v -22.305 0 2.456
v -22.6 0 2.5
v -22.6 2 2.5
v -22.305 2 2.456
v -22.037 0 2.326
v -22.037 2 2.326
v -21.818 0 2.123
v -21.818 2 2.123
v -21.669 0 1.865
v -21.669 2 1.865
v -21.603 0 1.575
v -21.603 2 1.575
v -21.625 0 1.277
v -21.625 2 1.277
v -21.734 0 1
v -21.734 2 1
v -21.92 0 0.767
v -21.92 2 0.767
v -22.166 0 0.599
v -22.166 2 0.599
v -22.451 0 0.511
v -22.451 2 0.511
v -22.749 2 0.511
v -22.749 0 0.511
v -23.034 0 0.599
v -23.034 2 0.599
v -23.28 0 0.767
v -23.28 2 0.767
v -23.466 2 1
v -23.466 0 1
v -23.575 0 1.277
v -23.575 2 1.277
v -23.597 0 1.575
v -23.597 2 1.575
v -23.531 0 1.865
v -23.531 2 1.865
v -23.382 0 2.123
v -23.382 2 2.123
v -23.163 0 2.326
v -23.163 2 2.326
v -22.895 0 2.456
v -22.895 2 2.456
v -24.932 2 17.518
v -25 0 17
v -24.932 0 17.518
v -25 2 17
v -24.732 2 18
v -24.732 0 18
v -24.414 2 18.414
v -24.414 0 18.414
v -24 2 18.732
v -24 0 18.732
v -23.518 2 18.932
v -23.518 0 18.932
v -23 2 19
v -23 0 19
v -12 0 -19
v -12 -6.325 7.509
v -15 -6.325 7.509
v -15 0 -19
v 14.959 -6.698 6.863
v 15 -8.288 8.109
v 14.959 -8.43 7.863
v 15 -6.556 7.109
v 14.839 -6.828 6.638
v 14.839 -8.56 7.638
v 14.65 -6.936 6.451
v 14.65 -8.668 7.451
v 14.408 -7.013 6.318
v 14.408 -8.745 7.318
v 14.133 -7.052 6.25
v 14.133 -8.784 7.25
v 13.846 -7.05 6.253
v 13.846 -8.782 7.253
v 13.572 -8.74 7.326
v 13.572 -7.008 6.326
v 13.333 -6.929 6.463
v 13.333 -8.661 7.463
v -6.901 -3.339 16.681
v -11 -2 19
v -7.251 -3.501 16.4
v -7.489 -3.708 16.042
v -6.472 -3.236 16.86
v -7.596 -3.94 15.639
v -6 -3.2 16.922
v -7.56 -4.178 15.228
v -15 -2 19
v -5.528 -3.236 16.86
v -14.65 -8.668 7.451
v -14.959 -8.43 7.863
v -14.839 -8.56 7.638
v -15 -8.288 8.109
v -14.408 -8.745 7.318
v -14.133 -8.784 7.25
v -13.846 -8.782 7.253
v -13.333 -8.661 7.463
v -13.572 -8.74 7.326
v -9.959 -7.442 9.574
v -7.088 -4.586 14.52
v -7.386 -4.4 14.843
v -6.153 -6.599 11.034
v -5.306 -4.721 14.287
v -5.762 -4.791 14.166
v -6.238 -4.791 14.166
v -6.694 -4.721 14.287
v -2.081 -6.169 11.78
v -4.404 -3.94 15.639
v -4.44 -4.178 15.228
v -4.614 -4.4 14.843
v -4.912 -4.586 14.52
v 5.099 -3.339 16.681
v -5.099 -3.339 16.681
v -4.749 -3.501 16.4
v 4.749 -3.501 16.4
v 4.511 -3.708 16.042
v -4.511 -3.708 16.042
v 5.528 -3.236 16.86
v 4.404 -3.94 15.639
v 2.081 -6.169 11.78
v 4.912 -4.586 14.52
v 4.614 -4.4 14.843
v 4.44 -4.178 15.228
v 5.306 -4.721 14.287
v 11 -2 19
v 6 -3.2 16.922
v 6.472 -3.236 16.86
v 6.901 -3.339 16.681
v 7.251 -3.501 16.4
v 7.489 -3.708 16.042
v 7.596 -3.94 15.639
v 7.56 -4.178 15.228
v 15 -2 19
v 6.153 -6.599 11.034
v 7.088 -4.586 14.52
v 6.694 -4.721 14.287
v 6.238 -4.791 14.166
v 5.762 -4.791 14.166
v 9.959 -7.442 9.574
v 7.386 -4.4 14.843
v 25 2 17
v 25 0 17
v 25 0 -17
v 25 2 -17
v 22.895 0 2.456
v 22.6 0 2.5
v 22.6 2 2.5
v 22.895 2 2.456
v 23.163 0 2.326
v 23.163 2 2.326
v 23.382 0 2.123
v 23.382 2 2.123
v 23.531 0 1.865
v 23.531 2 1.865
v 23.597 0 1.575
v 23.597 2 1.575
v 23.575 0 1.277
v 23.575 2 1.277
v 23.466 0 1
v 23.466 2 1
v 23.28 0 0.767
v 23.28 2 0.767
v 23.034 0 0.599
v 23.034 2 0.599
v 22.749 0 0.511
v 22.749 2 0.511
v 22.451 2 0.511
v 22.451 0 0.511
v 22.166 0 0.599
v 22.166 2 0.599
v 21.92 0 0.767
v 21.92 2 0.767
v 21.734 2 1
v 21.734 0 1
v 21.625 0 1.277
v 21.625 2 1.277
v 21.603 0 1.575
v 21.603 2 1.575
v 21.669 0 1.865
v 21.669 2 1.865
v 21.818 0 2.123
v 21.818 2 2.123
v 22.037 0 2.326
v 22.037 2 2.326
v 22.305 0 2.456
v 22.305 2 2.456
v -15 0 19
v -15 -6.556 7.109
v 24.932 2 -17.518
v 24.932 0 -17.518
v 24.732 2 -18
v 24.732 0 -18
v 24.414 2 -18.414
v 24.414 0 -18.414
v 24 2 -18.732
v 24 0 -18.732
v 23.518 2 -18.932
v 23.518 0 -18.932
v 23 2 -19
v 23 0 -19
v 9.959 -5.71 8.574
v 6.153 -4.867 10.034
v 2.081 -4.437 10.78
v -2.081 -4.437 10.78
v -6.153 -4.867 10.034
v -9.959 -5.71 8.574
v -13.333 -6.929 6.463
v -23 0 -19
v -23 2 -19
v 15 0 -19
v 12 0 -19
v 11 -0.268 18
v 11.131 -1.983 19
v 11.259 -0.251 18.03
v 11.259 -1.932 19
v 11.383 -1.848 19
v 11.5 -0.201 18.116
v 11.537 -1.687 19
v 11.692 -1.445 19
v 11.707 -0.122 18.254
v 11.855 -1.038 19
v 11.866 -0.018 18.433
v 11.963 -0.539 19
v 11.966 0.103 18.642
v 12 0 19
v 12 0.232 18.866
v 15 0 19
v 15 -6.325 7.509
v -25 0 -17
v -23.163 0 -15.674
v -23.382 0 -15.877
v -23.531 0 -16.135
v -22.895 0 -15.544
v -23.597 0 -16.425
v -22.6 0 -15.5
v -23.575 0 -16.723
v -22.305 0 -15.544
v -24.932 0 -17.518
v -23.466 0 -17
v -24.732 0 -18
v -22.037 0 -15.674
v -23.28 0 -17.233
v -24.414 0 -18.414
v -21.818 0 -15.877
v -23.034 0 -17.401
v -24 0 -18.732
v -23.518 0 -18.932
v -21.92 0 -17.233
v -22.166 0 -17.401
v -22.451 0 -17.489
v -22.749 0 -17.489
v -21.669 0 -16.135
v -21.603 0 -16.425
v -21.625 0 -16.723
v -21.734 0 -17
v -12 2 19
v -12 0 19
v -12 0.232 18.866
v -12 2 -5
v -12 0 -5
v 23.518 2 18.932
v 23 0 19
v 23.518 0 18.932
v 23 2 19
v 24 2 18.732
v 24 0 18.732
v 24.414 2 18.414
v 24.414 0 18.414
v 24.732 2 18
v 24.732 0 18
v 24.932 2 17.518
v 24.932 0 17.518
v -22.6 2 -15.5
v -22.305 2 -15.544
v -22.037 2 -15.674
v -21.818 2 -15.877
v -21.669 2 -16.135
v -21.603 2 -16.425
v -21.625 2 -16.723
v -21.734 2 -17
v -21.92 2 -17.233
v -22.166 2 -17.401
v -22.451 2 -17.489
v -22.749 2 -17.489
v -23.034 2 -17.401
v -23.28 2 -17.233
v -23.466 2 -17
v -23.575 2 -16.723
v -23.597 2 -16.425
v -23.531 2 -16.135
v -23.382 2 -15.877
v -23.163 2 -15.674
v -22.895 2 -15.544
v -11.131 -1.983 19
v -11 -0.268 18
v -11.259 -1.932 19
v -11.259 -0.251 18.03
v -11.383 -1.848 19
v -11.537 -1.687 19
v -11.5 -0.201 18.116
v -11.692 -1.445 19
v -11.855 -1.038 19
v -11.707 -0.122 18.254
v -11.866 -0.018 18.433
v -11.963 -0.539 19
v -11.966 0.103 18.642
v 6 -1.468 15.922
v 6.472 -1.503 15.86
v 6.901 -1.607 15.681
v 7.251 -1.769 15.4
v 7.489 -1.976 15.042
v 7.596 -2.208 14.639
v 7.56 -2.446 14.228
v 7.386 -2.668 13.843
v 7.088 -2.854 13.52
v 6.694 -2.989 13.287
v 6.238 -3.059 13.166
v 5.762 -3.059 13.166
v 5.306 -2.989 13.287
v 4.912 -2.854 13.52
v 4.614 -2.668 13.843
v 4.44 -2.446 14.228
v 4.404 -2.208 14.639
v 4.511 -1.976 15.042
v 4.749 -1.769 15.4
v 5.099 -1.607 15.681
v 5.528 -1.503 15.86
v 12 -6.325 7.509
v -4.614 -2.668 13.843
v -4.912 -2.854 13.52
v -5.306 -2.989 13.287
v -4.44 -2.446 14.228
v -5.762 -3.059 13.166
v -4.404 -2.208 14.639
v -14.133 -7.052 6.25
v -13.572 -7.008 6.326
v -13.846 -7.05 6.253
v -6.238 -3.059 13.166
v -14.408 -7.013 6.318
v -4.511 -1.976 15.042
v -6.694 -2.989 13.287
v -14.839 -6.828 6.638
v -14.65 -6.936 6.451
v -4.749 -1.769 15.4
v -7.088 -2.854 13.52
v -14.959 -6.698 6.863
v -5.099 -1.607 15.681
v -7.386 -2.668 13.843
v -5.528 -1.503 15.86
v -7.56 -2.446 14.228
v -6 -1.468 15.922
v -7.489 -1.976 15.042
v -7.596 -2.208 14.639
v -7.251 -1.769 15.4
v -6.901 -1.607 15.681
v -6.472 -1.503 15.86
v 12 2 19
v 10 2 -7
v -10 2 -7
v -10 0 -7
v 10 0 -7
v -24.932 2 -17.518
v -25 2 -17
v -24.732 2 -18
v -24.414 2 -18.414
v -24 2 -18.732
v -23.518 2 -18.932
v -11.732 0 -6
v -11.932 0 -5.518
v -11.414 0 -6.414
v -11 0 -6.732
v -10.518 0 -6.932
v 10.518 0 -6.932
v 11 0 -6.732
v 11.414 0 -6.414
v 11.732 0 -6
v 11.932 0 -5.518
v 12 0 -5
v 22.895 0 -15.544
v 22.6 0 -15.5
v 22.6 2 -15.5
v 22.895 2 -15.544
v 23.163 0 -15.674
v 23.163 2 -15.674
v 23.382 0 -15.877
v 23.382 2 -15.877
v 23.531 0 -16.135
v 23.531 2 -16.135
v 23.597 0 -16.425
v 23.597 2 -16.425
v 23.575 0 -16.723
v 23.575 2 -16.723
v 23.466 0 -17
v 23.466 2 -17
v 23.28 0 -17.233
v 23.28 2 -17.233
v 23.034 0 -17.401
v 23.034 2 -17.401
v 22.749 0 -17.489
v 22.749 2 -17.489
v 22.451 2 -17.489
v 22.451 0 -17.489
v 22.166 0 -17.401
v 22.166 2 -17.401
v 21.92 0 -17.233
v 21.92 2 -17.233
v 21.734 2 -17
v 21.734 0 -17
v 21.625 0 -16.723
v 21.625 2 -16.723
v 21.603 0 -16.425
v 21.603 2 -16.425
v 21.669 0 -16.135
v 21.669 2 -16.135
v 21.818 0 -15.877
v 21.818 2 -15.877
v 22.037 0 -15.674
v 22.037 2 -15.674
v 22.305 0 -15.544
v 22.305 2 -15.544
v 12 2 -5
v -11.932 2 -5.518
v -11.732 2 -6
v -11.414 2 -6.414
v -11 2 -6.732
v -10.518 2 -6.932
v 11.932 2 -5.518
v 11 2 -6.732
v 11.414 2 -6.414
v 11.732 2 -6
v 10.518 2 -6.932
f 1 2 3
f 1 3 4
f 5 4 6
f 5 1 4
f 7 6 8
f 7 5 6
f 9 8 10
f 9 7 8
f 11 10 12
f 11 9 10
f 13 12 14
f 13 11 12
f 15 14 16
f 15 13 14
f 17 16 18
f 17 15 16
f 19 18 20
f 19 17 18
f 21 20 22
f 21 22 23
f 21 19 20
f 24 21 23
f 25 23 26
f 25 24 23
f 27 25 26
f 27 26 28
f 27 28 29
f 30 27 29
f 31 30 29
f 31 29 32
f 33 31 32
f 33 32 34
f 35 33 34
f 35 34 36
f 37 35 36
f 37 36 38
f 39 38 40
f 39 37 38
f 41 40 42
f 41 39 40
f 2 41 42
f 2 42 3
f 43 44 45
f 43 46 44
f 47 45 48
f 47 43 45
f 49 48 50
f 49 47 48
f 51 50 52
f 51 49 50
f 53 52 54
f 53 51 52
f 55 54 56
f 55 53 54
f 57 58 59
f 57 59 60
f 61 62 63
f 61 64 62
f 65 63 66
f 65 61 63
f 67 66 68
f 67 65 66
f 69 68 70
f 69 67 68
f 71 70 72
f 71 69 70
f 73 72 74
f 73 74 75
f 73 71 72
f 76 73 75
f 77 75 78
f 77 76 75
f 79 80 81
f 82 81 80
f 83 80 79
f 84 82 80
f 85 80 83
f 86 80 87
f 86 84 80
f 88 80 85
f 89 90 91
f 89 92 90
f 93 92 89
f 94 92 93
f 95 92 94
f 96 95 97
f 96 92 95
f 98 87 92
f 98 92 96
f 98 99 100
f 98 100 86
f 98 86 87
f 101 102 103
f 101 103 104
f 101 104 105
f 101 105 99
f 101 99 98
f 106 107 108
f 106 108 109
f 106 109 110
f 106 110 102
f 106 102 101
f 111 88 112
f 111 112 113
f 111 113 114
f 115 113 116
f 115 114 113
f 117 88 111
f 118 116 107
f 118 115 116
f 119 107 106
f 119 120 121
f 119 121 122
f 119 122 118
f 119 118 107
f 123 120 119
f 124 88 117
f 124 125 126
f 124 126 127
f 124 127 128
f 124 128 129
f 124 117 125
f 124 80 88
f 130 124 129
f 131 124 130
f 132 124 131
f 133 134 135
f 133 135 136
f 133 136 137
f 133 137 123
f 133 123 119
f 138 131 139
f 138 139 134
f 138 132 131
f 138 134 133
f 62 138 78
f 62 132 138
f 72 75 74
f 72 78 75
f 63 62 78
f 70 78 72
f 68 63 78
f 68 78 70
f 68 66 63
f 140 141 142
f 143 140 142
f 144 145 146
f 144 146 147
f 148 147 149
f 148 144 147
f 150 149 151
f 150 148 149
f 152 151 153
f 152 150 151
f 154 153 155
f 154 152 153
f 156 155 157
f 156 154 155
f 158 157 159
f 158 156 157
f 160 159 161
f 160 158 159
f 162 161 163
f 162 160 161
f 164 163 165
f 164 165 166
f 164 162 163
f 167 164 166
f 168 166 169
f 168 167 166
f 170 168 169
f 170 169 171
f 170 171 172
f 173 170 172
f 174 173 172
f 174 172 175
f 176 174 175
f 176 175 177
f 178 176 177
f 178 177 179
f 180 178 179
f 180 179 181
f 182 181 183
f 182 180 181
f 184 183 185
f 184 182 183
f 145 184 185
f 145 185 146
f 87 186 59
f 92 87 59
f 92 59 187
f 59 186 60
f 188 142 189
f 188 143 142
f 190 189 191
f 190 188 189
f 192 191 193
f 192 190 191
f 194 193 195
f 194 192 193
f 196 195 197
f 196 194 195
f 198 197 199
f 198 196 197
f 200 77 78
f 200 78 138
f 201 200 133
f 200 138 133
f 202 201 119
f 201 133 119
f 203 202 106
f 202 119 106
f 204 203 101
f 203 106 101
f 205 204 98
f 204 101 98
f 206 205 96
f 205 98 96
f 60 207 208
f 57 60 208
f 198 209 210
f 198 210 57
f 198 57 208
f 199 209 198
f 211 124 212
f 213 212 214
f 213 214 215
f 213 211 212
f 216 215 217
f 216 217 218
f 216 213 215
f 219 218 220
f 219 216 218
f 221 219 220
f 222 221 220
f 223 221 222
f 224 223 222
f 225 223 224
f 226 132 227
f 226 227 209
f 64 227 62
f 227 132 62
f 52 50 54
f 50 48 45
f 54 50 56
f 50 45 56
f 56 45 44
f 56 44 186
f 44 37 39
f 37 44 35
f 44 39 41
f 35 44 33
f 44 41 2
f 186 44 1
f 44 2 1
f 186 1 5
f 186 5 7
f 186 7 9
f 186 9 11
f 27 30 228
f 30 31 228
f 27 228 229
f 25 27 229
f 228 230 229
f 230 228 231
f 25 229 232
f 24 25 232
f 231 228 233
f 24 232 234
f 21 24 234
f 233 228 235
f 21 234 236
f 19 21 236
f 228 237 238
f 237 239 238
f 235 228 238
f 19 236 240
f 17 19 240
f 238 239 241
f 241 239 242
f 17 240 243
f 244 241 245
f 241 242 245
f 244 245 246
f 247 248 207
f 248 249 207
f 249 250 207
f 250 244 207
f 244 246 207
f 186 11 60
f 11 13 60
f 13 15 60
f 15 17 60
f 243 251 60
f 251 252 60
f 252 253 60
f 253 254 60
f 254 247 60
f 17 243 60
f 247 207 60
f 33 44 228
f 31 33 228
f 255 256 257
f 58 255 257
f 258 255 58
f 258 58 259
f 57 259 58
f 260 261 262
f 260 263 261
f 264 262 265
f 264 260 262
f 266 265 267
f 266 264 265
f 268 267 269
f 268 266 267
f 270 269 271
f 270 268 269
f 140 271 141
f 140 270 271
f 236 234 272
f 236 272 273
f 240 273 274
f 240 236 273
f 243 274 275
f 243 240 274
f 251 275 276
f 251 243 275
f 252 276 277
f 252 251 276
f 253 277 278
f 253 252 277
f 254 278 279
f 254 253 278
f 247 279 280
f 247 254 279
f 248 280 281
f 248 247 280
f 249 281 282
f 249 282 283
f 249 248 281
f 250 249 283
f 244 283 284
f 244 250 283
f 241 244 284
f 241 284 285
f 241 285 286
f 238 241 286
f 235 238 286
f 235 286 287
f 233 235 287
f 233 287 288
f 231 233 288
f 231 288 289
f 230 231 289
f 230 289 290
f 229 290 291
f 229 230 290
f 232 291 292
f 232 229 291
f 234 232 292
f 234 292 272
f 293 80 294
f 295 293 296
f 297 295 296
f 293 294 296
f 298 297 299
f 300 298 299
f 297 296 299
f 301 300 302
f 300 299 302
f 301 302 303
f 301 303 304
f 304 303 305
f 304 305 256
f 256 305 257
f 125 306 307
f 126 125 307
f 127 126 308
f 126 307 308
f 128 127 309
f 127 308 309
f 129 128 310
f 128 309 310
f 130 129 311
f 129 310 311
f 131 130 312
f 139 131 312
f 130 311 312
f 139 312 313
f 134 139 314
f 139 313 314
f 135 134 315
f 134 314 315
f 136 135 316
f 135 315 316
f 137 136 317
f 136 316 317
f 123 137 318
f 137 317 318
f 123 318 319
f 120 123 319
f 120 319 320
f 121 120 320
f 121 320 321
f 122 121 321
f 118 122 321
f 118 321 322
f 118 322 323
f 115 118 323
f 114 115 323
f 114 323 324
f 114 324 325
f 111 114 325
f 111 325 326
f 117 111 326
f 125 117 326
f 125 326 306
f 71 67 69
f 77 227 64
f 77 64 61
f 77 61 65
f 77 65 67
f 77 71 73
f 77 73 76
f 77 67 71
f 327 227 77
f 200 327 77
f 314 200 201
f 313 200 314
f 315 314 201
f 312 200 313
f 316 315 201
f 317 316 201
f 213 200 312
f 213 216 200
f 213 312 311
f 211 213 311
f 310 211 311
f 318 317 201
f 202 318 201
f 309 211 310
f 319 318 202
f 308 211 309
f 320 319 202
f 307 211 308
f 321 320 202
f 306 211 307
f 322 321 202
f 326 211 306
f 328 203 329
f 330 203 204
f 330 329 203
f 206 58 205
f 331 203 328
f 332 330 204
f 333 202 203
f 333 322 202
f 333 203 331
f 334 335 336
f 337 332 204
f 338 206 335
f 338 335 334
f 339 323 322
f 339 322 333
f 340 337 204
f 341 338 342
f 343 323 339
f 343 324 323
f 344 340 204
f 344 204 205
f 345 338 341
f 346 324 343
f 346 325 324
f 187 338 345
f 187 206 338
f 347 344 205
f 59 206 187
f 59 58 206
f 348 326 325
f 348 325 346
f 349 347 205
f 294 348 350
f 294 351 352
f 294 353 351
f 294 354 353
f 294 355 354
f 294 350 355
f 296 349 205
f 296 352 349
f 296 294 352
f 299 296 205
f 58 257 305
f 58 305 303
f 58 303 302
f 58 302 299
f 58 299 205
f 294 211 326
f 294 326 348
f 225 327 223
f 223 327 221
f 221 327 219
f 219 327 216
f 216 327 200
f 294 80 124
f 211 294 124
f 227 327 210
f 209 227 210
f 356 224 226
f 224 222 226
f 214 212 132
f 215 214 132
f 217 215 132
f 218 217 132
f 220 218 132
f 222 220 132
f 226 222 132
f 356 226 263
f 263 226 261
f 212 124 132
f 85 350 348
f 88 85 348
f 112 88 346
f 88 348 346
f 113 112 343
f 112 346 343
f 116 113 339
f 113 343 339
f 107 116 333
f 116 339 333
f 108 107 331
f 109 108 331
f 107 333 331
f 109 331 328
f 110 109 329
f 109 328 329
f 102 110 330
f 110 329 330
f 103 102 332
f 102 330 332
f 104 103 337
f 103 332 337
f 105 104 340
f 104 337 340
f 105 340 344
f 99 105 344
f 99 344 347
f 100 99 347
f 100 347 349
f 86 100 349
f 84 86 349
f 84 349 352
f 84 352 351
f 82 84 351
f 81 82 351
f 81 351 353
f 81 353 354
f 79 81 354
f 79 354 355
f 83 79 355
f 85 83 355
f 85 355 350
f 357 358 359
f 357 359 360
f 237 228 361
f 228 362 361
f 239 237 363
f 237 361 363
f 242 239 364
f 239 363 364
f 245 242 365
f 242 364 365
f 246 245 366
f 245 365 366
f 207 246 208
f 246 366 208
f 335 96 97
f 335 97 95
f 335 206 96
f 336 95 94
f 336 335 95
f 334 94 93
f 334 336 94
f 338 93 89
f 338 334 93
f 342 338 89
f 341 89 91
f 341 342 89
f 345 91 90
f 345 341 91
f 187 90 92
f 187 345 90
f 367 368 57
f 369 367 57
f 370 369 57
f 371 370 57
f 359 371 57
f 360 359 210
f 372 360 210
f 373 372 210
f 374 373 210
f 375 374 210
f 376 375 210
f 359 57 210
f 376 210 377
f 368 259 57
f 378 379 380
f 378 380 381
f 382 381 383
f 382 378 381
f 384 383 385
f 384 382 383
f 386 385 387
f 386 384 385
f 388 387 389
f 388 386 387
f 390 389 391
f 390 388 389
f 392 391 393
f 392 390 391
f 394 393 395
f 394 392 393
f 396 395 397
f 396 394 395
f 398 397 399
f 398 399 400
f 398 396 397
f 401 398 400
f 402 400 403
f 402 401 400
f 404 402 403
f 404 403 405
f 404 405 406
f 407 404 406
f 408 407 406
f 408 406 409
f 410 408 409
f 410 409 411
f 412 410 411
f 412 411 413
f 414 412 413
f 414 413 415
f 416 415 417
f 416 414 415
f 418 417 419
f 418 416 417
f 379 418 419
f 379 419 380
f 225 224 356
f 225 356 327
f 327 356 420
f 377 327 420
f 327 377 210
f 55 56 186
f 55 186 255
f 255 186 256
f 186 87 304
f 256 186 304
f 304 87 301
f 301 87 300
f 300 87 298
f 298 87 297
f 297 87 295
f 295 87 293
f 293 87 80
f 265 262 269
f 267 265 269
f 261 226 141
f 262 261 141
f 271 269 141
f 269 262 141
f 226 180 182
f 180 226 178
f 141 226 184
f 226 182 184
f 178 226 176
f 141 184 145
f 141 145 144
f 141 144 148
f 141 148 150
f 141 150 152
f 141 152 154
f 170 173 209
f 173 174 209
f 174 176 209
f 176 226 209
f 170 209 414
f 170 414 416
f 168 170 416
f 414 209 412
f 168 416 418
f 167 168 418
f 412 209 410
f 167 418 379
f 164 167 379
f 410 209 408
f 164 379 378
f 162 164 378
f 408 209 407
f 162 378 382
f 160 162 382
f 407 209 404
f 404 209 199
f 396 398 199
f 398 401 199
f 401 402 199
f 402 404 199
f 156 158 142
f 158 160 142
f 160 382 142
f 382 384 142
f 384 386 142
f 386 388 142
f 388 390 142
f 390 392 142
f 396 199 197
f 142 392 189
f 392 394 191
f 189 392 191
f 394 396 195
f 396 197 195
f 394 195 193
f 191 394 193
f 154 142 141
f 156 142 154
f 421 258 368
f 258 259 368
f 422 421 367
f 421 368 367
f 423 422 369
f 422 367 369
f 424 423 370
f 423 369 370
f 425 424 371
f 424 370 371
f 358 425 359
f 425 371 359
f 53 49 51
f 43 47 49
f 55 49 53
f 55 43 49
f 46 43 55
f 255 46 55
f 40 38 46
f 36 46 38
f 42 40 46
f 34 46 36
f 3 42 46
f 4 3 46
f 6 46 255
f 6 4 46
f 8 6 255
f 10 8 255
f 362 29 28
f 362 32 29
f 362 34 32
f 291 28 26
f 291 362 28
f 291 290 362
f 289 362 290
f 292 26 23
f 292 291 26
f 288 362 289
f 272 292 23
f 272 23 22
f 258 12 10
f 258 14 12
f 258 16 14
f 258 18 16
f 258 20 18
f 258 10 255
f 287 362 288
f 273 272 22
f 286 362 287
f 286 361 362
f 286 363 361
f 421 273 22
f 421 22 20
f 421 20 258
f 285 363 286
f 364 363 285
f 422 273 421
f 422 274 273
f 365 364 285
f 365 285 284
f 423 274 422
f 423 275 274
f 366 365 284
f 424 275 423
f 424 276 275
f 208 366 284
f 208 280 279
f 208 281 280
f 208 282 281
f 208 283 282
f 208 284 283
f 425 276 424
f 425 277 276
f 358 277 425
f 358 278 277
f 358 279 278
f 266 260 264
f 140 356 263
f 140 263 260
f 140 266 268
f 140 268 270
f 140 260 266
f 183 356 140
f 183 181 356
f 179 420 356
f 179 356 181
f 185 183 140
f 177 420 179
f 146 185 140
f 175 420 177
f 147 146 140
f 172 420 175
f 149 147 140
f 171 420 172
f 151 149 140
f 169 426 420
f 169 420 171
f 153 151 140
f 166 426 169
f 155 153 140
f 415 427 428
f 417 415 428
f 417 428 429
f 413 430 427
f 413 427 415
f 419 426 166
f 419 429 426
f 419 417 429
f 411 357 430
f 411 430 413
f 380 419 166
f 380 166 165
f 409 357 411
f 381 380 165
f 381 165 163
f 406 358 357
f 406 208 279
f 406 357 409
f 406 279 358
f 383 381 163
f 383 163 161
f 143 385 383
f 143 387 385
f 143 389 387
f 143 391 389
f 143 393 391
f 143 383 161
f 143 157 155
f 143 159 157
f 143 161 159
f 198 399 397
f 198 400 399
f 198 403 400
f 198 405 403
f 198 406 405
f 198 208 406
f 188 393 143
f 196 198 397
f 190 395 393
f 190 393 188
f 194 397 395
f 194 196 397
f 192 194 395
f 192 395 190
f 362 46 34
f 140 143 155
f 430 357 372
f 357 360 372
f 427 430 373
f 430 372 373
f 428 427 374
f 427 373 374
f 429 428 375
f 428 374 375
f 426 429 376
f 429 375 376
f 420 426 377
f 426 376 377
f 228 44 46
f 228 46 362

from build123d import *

# Parameters (mm, degrees)
SKETCH_1_W          = 50
SKETCH_1_H          = 38
SKETCH_1_R          = 1.0000000000000018
SKETCH_1_R_2        = 1.0000000000000016
EXTRUDE_1_DEPTH     = 2
EXTRUDE_2_DEPTH     = 3
SKETCH_5_W          = 24
SKETCH_5_H          = 26
CUT_EXTRUDE_1_DEPTH = 33.66496594212216
FILLET_1_R          = 2
EXTRUDE_6_DEPTH     = 2
CUT_EXTRUDE_2_REACH = 38.993
FILLET_2_R          = 1
CUT_EXTRUDE_3_REACH = 37.814
SKETCH_8_R          = 1.6
SKETCH_8_R_2        = 1.6000000000000019


with BuildPart() as part:
    # 草图1 → 凸台-拉伸1 (new body)
    with BuildSketch(Plane(origin=(0, 0, 0), x_dir=(1, 0, 0), z_dir=(0, 1, 0))):
        Rectangle(SKETCH_1_W, SKETCH_1_H)
        with Locations(Location((-22.600000000000005, 16.500000000000004, 0), (0, 0, 270))):
            Circle(SKETCH_1_R, mode=Mode.SUBTRACT)
        with Locations(Location((-22.600000000000005, -1.4999999999999944, 0), (0, 0, 270))):
            Circle(SKETCH_1_R_2, mode=Mode.SUBTRACT)
        with Locations(Location((22.599999999999998, 16.500000000000004, 0), (0, 0, 270))):
            Circle(SKETCH_1_R, mode=Mode.SUBTRACT)
        with Locations(Location((22.599999999999998, -1.4999999999999944, 0), (0, 0, 270))):
            Circle(SKETCH_1_R_2, mode=Mode.SUBTRACT)
    extrude(amount=EXTRUDE_1_DEPTH)

    # 草图3 → 凸台-拉伸2 (add)
    with BuildSketch(Plane(origin=(12, 0, 0), x_dir=(0, 0, -1), z_dir=(1, 0, 0))):
        Polygon((-18.999999999999996, -2), (-10.339745962155614, -7.000000000000011), (19.000000000000004, 0), (-18.999999999999996, 0), align=None)
    extrude_2 = extrude(amount=EXTRUDE_2_DEPTH)

    # 镜向1: 凸台-拉伸2 across plane
    add(extrude_2.mirror(Plane(origin=(0, 0, 0), x_dir=(0, 0, 1), z_dir=(1, 0, 0))))

    # 草图5 → 切除-拉伸1 (cut, through all)
    with BuildSketch(Plane(origin=(0, 2, 0), x_dir=(1, 0, 0), z_dir=(0, 1, 0))):
        with Locations((0, -5.9999999999999964)):
            Rectangle(SKETCH_5_W, SKETCH_5_H)
    extrude(amount=-CUT_EXTRUDE_1_DEPTH, mode=Mode.SUBTRACT)

    # 圆角1
    fillet_1_edges = [part.edges().sort_by_distance(p)[0] for p in [
        (12, 1, -7.000000000000003),
        (-12, 1, -7.000000000000003),
        (25.000000000000004, 1, 18.999999999999996),
        (-24.999999999999996, 1, 18.999999999999996),
        (-24.999999999999996, 1, -19.000000000000004),
        (25.000000000000004, 1, -19.000000000000004),
    ]]
    fillet(fillet_1_edges, radius=FILLET_1_R)

    # 草图6 → 凸台-拉伸6 (add)
    with BuildSketch(Plane(origin=(0, -9.72724133595218, 5.616025403784458), x_dir=(1, 0, 0), z_dir=(0, -0.866025403784438, 0.5000000000000011))):
        Polygon((-15, 15.45448267190432), (15, 15.45448267190432), (15, -0.5455173280956814), (-14.999999999999998, -0.5455173280956814), align=None)
    extrude(amount=-EXTRUDE_6_DEPTH)

    # 草图7 → 切除-拉伸2 (cut, up to next)
    with BuildSketch(Plane(origin=(0, -9.72724133595218, 5.616025403784458), x_dir=(1, 0, 0), z_dir=(0, -0.866025403784438, 0.5000000000000011)), mode=Mode.PRIVATE) as cut_extrude_2_sk1:
        with BuildLine():
            Line((-14.999999999999998, -0.5455173280956823), (15, -0.5455173280956823))
            Line((15, -0.5455173280956823), (14.999999999999996, 0.45448267190431774))
            ThreePointArc((14.999999999999996, 0.45448267190431774), (-3.22e-15, 7.225726116581361), (-14.999999999999998, 0.454482671904316))
            Line((-14.999999999999998, 0.454482671904316), (-14.999999999999998, -0.5455173280956823))
        make_face()
    cut_extrude_2_tool1 = extrude(cut_extrude_2_sk1.sketch, amount=-CUT_EXTRUDE_2_REACH, mode=Mode.PRIVATE) & part.part
    add(cut_extrude_2_tool1.solids().sort_by_distance((0, -8.409568, 7.898302))[0], mode=Mode.SUBTRACT)

    # 圆角2
    fillet_2_edges = [part.edges().sort_by_distance(p)[0] for p in [
        (-12, -1.133974596215562, 18.499999999999996),
        (12, -1.1339745962155647, 18.499999999999993),
        (14.999999999999996, -8.63397459621558, 5.5096189432334235),
        (-15, -8.633974596215584, 5.509618943233422),
    ]]
    fillet(fillet_2_edges, radius=FILLET_2_R)

    # 草图8 → 切除-拉伸3 (cut, up to next)
    with BuildSketch(Plane(origin=(0, -7.9951905283833, 4.616025403784459), x_dir=(1, 0, 0), z_dir=(0, 0.866025403784438, -0.5000000000000012)), mode=Mode.PRIVATE) as cut_extrude_3_sk1:
        with Locations(Location((-5.999999999999998, -11.454482671904318, 0), (0, 0, 270))):
            Circle(SKETCH_8_R)
    cut_extrude_3_tool1 = extrude(cut_extrude_3_sk1.sketch, amount=-CUT_EXTRUDE_3_REACH, mode=Mode.PRIVATE) & part.part
    # 草图8 → 切除-拉伸3 (cut, up to next)
    with BuildSketch(Plane(origin=(0, -7.9951905283833, 4.616025403784459), x_dir=(1, 0, 0), z_dir=(0, 0.866025403784438, -0.5000000000000012)), mode=Mode.PRIVATE) as cut_extrude_3_sk2:
        with Locations(Location((6.000000000000002, -11.454482671904316, 0), (0, 0, 270))):
            Circle(SKETCH_8_R_2)
    cut_extrude_3_tool2 = extrude(cut_extrude_3_sk2.sketch, amount=-CUT_EXTRUDE_3_REACH, mode=Mode.PRIVATE) & part.part
    add(cut_extrude_3_tool1.solids().sort_by_distance((-6, -2.267949, 14.535898))[0], mode=Mode.SUBTRACT)
    add(cut_extrude_3_tool2.solids().sort_by_distance((6, -2.267949, 14.535898))[0], mode=Mode.SUBTRACT)


solid = part.part
